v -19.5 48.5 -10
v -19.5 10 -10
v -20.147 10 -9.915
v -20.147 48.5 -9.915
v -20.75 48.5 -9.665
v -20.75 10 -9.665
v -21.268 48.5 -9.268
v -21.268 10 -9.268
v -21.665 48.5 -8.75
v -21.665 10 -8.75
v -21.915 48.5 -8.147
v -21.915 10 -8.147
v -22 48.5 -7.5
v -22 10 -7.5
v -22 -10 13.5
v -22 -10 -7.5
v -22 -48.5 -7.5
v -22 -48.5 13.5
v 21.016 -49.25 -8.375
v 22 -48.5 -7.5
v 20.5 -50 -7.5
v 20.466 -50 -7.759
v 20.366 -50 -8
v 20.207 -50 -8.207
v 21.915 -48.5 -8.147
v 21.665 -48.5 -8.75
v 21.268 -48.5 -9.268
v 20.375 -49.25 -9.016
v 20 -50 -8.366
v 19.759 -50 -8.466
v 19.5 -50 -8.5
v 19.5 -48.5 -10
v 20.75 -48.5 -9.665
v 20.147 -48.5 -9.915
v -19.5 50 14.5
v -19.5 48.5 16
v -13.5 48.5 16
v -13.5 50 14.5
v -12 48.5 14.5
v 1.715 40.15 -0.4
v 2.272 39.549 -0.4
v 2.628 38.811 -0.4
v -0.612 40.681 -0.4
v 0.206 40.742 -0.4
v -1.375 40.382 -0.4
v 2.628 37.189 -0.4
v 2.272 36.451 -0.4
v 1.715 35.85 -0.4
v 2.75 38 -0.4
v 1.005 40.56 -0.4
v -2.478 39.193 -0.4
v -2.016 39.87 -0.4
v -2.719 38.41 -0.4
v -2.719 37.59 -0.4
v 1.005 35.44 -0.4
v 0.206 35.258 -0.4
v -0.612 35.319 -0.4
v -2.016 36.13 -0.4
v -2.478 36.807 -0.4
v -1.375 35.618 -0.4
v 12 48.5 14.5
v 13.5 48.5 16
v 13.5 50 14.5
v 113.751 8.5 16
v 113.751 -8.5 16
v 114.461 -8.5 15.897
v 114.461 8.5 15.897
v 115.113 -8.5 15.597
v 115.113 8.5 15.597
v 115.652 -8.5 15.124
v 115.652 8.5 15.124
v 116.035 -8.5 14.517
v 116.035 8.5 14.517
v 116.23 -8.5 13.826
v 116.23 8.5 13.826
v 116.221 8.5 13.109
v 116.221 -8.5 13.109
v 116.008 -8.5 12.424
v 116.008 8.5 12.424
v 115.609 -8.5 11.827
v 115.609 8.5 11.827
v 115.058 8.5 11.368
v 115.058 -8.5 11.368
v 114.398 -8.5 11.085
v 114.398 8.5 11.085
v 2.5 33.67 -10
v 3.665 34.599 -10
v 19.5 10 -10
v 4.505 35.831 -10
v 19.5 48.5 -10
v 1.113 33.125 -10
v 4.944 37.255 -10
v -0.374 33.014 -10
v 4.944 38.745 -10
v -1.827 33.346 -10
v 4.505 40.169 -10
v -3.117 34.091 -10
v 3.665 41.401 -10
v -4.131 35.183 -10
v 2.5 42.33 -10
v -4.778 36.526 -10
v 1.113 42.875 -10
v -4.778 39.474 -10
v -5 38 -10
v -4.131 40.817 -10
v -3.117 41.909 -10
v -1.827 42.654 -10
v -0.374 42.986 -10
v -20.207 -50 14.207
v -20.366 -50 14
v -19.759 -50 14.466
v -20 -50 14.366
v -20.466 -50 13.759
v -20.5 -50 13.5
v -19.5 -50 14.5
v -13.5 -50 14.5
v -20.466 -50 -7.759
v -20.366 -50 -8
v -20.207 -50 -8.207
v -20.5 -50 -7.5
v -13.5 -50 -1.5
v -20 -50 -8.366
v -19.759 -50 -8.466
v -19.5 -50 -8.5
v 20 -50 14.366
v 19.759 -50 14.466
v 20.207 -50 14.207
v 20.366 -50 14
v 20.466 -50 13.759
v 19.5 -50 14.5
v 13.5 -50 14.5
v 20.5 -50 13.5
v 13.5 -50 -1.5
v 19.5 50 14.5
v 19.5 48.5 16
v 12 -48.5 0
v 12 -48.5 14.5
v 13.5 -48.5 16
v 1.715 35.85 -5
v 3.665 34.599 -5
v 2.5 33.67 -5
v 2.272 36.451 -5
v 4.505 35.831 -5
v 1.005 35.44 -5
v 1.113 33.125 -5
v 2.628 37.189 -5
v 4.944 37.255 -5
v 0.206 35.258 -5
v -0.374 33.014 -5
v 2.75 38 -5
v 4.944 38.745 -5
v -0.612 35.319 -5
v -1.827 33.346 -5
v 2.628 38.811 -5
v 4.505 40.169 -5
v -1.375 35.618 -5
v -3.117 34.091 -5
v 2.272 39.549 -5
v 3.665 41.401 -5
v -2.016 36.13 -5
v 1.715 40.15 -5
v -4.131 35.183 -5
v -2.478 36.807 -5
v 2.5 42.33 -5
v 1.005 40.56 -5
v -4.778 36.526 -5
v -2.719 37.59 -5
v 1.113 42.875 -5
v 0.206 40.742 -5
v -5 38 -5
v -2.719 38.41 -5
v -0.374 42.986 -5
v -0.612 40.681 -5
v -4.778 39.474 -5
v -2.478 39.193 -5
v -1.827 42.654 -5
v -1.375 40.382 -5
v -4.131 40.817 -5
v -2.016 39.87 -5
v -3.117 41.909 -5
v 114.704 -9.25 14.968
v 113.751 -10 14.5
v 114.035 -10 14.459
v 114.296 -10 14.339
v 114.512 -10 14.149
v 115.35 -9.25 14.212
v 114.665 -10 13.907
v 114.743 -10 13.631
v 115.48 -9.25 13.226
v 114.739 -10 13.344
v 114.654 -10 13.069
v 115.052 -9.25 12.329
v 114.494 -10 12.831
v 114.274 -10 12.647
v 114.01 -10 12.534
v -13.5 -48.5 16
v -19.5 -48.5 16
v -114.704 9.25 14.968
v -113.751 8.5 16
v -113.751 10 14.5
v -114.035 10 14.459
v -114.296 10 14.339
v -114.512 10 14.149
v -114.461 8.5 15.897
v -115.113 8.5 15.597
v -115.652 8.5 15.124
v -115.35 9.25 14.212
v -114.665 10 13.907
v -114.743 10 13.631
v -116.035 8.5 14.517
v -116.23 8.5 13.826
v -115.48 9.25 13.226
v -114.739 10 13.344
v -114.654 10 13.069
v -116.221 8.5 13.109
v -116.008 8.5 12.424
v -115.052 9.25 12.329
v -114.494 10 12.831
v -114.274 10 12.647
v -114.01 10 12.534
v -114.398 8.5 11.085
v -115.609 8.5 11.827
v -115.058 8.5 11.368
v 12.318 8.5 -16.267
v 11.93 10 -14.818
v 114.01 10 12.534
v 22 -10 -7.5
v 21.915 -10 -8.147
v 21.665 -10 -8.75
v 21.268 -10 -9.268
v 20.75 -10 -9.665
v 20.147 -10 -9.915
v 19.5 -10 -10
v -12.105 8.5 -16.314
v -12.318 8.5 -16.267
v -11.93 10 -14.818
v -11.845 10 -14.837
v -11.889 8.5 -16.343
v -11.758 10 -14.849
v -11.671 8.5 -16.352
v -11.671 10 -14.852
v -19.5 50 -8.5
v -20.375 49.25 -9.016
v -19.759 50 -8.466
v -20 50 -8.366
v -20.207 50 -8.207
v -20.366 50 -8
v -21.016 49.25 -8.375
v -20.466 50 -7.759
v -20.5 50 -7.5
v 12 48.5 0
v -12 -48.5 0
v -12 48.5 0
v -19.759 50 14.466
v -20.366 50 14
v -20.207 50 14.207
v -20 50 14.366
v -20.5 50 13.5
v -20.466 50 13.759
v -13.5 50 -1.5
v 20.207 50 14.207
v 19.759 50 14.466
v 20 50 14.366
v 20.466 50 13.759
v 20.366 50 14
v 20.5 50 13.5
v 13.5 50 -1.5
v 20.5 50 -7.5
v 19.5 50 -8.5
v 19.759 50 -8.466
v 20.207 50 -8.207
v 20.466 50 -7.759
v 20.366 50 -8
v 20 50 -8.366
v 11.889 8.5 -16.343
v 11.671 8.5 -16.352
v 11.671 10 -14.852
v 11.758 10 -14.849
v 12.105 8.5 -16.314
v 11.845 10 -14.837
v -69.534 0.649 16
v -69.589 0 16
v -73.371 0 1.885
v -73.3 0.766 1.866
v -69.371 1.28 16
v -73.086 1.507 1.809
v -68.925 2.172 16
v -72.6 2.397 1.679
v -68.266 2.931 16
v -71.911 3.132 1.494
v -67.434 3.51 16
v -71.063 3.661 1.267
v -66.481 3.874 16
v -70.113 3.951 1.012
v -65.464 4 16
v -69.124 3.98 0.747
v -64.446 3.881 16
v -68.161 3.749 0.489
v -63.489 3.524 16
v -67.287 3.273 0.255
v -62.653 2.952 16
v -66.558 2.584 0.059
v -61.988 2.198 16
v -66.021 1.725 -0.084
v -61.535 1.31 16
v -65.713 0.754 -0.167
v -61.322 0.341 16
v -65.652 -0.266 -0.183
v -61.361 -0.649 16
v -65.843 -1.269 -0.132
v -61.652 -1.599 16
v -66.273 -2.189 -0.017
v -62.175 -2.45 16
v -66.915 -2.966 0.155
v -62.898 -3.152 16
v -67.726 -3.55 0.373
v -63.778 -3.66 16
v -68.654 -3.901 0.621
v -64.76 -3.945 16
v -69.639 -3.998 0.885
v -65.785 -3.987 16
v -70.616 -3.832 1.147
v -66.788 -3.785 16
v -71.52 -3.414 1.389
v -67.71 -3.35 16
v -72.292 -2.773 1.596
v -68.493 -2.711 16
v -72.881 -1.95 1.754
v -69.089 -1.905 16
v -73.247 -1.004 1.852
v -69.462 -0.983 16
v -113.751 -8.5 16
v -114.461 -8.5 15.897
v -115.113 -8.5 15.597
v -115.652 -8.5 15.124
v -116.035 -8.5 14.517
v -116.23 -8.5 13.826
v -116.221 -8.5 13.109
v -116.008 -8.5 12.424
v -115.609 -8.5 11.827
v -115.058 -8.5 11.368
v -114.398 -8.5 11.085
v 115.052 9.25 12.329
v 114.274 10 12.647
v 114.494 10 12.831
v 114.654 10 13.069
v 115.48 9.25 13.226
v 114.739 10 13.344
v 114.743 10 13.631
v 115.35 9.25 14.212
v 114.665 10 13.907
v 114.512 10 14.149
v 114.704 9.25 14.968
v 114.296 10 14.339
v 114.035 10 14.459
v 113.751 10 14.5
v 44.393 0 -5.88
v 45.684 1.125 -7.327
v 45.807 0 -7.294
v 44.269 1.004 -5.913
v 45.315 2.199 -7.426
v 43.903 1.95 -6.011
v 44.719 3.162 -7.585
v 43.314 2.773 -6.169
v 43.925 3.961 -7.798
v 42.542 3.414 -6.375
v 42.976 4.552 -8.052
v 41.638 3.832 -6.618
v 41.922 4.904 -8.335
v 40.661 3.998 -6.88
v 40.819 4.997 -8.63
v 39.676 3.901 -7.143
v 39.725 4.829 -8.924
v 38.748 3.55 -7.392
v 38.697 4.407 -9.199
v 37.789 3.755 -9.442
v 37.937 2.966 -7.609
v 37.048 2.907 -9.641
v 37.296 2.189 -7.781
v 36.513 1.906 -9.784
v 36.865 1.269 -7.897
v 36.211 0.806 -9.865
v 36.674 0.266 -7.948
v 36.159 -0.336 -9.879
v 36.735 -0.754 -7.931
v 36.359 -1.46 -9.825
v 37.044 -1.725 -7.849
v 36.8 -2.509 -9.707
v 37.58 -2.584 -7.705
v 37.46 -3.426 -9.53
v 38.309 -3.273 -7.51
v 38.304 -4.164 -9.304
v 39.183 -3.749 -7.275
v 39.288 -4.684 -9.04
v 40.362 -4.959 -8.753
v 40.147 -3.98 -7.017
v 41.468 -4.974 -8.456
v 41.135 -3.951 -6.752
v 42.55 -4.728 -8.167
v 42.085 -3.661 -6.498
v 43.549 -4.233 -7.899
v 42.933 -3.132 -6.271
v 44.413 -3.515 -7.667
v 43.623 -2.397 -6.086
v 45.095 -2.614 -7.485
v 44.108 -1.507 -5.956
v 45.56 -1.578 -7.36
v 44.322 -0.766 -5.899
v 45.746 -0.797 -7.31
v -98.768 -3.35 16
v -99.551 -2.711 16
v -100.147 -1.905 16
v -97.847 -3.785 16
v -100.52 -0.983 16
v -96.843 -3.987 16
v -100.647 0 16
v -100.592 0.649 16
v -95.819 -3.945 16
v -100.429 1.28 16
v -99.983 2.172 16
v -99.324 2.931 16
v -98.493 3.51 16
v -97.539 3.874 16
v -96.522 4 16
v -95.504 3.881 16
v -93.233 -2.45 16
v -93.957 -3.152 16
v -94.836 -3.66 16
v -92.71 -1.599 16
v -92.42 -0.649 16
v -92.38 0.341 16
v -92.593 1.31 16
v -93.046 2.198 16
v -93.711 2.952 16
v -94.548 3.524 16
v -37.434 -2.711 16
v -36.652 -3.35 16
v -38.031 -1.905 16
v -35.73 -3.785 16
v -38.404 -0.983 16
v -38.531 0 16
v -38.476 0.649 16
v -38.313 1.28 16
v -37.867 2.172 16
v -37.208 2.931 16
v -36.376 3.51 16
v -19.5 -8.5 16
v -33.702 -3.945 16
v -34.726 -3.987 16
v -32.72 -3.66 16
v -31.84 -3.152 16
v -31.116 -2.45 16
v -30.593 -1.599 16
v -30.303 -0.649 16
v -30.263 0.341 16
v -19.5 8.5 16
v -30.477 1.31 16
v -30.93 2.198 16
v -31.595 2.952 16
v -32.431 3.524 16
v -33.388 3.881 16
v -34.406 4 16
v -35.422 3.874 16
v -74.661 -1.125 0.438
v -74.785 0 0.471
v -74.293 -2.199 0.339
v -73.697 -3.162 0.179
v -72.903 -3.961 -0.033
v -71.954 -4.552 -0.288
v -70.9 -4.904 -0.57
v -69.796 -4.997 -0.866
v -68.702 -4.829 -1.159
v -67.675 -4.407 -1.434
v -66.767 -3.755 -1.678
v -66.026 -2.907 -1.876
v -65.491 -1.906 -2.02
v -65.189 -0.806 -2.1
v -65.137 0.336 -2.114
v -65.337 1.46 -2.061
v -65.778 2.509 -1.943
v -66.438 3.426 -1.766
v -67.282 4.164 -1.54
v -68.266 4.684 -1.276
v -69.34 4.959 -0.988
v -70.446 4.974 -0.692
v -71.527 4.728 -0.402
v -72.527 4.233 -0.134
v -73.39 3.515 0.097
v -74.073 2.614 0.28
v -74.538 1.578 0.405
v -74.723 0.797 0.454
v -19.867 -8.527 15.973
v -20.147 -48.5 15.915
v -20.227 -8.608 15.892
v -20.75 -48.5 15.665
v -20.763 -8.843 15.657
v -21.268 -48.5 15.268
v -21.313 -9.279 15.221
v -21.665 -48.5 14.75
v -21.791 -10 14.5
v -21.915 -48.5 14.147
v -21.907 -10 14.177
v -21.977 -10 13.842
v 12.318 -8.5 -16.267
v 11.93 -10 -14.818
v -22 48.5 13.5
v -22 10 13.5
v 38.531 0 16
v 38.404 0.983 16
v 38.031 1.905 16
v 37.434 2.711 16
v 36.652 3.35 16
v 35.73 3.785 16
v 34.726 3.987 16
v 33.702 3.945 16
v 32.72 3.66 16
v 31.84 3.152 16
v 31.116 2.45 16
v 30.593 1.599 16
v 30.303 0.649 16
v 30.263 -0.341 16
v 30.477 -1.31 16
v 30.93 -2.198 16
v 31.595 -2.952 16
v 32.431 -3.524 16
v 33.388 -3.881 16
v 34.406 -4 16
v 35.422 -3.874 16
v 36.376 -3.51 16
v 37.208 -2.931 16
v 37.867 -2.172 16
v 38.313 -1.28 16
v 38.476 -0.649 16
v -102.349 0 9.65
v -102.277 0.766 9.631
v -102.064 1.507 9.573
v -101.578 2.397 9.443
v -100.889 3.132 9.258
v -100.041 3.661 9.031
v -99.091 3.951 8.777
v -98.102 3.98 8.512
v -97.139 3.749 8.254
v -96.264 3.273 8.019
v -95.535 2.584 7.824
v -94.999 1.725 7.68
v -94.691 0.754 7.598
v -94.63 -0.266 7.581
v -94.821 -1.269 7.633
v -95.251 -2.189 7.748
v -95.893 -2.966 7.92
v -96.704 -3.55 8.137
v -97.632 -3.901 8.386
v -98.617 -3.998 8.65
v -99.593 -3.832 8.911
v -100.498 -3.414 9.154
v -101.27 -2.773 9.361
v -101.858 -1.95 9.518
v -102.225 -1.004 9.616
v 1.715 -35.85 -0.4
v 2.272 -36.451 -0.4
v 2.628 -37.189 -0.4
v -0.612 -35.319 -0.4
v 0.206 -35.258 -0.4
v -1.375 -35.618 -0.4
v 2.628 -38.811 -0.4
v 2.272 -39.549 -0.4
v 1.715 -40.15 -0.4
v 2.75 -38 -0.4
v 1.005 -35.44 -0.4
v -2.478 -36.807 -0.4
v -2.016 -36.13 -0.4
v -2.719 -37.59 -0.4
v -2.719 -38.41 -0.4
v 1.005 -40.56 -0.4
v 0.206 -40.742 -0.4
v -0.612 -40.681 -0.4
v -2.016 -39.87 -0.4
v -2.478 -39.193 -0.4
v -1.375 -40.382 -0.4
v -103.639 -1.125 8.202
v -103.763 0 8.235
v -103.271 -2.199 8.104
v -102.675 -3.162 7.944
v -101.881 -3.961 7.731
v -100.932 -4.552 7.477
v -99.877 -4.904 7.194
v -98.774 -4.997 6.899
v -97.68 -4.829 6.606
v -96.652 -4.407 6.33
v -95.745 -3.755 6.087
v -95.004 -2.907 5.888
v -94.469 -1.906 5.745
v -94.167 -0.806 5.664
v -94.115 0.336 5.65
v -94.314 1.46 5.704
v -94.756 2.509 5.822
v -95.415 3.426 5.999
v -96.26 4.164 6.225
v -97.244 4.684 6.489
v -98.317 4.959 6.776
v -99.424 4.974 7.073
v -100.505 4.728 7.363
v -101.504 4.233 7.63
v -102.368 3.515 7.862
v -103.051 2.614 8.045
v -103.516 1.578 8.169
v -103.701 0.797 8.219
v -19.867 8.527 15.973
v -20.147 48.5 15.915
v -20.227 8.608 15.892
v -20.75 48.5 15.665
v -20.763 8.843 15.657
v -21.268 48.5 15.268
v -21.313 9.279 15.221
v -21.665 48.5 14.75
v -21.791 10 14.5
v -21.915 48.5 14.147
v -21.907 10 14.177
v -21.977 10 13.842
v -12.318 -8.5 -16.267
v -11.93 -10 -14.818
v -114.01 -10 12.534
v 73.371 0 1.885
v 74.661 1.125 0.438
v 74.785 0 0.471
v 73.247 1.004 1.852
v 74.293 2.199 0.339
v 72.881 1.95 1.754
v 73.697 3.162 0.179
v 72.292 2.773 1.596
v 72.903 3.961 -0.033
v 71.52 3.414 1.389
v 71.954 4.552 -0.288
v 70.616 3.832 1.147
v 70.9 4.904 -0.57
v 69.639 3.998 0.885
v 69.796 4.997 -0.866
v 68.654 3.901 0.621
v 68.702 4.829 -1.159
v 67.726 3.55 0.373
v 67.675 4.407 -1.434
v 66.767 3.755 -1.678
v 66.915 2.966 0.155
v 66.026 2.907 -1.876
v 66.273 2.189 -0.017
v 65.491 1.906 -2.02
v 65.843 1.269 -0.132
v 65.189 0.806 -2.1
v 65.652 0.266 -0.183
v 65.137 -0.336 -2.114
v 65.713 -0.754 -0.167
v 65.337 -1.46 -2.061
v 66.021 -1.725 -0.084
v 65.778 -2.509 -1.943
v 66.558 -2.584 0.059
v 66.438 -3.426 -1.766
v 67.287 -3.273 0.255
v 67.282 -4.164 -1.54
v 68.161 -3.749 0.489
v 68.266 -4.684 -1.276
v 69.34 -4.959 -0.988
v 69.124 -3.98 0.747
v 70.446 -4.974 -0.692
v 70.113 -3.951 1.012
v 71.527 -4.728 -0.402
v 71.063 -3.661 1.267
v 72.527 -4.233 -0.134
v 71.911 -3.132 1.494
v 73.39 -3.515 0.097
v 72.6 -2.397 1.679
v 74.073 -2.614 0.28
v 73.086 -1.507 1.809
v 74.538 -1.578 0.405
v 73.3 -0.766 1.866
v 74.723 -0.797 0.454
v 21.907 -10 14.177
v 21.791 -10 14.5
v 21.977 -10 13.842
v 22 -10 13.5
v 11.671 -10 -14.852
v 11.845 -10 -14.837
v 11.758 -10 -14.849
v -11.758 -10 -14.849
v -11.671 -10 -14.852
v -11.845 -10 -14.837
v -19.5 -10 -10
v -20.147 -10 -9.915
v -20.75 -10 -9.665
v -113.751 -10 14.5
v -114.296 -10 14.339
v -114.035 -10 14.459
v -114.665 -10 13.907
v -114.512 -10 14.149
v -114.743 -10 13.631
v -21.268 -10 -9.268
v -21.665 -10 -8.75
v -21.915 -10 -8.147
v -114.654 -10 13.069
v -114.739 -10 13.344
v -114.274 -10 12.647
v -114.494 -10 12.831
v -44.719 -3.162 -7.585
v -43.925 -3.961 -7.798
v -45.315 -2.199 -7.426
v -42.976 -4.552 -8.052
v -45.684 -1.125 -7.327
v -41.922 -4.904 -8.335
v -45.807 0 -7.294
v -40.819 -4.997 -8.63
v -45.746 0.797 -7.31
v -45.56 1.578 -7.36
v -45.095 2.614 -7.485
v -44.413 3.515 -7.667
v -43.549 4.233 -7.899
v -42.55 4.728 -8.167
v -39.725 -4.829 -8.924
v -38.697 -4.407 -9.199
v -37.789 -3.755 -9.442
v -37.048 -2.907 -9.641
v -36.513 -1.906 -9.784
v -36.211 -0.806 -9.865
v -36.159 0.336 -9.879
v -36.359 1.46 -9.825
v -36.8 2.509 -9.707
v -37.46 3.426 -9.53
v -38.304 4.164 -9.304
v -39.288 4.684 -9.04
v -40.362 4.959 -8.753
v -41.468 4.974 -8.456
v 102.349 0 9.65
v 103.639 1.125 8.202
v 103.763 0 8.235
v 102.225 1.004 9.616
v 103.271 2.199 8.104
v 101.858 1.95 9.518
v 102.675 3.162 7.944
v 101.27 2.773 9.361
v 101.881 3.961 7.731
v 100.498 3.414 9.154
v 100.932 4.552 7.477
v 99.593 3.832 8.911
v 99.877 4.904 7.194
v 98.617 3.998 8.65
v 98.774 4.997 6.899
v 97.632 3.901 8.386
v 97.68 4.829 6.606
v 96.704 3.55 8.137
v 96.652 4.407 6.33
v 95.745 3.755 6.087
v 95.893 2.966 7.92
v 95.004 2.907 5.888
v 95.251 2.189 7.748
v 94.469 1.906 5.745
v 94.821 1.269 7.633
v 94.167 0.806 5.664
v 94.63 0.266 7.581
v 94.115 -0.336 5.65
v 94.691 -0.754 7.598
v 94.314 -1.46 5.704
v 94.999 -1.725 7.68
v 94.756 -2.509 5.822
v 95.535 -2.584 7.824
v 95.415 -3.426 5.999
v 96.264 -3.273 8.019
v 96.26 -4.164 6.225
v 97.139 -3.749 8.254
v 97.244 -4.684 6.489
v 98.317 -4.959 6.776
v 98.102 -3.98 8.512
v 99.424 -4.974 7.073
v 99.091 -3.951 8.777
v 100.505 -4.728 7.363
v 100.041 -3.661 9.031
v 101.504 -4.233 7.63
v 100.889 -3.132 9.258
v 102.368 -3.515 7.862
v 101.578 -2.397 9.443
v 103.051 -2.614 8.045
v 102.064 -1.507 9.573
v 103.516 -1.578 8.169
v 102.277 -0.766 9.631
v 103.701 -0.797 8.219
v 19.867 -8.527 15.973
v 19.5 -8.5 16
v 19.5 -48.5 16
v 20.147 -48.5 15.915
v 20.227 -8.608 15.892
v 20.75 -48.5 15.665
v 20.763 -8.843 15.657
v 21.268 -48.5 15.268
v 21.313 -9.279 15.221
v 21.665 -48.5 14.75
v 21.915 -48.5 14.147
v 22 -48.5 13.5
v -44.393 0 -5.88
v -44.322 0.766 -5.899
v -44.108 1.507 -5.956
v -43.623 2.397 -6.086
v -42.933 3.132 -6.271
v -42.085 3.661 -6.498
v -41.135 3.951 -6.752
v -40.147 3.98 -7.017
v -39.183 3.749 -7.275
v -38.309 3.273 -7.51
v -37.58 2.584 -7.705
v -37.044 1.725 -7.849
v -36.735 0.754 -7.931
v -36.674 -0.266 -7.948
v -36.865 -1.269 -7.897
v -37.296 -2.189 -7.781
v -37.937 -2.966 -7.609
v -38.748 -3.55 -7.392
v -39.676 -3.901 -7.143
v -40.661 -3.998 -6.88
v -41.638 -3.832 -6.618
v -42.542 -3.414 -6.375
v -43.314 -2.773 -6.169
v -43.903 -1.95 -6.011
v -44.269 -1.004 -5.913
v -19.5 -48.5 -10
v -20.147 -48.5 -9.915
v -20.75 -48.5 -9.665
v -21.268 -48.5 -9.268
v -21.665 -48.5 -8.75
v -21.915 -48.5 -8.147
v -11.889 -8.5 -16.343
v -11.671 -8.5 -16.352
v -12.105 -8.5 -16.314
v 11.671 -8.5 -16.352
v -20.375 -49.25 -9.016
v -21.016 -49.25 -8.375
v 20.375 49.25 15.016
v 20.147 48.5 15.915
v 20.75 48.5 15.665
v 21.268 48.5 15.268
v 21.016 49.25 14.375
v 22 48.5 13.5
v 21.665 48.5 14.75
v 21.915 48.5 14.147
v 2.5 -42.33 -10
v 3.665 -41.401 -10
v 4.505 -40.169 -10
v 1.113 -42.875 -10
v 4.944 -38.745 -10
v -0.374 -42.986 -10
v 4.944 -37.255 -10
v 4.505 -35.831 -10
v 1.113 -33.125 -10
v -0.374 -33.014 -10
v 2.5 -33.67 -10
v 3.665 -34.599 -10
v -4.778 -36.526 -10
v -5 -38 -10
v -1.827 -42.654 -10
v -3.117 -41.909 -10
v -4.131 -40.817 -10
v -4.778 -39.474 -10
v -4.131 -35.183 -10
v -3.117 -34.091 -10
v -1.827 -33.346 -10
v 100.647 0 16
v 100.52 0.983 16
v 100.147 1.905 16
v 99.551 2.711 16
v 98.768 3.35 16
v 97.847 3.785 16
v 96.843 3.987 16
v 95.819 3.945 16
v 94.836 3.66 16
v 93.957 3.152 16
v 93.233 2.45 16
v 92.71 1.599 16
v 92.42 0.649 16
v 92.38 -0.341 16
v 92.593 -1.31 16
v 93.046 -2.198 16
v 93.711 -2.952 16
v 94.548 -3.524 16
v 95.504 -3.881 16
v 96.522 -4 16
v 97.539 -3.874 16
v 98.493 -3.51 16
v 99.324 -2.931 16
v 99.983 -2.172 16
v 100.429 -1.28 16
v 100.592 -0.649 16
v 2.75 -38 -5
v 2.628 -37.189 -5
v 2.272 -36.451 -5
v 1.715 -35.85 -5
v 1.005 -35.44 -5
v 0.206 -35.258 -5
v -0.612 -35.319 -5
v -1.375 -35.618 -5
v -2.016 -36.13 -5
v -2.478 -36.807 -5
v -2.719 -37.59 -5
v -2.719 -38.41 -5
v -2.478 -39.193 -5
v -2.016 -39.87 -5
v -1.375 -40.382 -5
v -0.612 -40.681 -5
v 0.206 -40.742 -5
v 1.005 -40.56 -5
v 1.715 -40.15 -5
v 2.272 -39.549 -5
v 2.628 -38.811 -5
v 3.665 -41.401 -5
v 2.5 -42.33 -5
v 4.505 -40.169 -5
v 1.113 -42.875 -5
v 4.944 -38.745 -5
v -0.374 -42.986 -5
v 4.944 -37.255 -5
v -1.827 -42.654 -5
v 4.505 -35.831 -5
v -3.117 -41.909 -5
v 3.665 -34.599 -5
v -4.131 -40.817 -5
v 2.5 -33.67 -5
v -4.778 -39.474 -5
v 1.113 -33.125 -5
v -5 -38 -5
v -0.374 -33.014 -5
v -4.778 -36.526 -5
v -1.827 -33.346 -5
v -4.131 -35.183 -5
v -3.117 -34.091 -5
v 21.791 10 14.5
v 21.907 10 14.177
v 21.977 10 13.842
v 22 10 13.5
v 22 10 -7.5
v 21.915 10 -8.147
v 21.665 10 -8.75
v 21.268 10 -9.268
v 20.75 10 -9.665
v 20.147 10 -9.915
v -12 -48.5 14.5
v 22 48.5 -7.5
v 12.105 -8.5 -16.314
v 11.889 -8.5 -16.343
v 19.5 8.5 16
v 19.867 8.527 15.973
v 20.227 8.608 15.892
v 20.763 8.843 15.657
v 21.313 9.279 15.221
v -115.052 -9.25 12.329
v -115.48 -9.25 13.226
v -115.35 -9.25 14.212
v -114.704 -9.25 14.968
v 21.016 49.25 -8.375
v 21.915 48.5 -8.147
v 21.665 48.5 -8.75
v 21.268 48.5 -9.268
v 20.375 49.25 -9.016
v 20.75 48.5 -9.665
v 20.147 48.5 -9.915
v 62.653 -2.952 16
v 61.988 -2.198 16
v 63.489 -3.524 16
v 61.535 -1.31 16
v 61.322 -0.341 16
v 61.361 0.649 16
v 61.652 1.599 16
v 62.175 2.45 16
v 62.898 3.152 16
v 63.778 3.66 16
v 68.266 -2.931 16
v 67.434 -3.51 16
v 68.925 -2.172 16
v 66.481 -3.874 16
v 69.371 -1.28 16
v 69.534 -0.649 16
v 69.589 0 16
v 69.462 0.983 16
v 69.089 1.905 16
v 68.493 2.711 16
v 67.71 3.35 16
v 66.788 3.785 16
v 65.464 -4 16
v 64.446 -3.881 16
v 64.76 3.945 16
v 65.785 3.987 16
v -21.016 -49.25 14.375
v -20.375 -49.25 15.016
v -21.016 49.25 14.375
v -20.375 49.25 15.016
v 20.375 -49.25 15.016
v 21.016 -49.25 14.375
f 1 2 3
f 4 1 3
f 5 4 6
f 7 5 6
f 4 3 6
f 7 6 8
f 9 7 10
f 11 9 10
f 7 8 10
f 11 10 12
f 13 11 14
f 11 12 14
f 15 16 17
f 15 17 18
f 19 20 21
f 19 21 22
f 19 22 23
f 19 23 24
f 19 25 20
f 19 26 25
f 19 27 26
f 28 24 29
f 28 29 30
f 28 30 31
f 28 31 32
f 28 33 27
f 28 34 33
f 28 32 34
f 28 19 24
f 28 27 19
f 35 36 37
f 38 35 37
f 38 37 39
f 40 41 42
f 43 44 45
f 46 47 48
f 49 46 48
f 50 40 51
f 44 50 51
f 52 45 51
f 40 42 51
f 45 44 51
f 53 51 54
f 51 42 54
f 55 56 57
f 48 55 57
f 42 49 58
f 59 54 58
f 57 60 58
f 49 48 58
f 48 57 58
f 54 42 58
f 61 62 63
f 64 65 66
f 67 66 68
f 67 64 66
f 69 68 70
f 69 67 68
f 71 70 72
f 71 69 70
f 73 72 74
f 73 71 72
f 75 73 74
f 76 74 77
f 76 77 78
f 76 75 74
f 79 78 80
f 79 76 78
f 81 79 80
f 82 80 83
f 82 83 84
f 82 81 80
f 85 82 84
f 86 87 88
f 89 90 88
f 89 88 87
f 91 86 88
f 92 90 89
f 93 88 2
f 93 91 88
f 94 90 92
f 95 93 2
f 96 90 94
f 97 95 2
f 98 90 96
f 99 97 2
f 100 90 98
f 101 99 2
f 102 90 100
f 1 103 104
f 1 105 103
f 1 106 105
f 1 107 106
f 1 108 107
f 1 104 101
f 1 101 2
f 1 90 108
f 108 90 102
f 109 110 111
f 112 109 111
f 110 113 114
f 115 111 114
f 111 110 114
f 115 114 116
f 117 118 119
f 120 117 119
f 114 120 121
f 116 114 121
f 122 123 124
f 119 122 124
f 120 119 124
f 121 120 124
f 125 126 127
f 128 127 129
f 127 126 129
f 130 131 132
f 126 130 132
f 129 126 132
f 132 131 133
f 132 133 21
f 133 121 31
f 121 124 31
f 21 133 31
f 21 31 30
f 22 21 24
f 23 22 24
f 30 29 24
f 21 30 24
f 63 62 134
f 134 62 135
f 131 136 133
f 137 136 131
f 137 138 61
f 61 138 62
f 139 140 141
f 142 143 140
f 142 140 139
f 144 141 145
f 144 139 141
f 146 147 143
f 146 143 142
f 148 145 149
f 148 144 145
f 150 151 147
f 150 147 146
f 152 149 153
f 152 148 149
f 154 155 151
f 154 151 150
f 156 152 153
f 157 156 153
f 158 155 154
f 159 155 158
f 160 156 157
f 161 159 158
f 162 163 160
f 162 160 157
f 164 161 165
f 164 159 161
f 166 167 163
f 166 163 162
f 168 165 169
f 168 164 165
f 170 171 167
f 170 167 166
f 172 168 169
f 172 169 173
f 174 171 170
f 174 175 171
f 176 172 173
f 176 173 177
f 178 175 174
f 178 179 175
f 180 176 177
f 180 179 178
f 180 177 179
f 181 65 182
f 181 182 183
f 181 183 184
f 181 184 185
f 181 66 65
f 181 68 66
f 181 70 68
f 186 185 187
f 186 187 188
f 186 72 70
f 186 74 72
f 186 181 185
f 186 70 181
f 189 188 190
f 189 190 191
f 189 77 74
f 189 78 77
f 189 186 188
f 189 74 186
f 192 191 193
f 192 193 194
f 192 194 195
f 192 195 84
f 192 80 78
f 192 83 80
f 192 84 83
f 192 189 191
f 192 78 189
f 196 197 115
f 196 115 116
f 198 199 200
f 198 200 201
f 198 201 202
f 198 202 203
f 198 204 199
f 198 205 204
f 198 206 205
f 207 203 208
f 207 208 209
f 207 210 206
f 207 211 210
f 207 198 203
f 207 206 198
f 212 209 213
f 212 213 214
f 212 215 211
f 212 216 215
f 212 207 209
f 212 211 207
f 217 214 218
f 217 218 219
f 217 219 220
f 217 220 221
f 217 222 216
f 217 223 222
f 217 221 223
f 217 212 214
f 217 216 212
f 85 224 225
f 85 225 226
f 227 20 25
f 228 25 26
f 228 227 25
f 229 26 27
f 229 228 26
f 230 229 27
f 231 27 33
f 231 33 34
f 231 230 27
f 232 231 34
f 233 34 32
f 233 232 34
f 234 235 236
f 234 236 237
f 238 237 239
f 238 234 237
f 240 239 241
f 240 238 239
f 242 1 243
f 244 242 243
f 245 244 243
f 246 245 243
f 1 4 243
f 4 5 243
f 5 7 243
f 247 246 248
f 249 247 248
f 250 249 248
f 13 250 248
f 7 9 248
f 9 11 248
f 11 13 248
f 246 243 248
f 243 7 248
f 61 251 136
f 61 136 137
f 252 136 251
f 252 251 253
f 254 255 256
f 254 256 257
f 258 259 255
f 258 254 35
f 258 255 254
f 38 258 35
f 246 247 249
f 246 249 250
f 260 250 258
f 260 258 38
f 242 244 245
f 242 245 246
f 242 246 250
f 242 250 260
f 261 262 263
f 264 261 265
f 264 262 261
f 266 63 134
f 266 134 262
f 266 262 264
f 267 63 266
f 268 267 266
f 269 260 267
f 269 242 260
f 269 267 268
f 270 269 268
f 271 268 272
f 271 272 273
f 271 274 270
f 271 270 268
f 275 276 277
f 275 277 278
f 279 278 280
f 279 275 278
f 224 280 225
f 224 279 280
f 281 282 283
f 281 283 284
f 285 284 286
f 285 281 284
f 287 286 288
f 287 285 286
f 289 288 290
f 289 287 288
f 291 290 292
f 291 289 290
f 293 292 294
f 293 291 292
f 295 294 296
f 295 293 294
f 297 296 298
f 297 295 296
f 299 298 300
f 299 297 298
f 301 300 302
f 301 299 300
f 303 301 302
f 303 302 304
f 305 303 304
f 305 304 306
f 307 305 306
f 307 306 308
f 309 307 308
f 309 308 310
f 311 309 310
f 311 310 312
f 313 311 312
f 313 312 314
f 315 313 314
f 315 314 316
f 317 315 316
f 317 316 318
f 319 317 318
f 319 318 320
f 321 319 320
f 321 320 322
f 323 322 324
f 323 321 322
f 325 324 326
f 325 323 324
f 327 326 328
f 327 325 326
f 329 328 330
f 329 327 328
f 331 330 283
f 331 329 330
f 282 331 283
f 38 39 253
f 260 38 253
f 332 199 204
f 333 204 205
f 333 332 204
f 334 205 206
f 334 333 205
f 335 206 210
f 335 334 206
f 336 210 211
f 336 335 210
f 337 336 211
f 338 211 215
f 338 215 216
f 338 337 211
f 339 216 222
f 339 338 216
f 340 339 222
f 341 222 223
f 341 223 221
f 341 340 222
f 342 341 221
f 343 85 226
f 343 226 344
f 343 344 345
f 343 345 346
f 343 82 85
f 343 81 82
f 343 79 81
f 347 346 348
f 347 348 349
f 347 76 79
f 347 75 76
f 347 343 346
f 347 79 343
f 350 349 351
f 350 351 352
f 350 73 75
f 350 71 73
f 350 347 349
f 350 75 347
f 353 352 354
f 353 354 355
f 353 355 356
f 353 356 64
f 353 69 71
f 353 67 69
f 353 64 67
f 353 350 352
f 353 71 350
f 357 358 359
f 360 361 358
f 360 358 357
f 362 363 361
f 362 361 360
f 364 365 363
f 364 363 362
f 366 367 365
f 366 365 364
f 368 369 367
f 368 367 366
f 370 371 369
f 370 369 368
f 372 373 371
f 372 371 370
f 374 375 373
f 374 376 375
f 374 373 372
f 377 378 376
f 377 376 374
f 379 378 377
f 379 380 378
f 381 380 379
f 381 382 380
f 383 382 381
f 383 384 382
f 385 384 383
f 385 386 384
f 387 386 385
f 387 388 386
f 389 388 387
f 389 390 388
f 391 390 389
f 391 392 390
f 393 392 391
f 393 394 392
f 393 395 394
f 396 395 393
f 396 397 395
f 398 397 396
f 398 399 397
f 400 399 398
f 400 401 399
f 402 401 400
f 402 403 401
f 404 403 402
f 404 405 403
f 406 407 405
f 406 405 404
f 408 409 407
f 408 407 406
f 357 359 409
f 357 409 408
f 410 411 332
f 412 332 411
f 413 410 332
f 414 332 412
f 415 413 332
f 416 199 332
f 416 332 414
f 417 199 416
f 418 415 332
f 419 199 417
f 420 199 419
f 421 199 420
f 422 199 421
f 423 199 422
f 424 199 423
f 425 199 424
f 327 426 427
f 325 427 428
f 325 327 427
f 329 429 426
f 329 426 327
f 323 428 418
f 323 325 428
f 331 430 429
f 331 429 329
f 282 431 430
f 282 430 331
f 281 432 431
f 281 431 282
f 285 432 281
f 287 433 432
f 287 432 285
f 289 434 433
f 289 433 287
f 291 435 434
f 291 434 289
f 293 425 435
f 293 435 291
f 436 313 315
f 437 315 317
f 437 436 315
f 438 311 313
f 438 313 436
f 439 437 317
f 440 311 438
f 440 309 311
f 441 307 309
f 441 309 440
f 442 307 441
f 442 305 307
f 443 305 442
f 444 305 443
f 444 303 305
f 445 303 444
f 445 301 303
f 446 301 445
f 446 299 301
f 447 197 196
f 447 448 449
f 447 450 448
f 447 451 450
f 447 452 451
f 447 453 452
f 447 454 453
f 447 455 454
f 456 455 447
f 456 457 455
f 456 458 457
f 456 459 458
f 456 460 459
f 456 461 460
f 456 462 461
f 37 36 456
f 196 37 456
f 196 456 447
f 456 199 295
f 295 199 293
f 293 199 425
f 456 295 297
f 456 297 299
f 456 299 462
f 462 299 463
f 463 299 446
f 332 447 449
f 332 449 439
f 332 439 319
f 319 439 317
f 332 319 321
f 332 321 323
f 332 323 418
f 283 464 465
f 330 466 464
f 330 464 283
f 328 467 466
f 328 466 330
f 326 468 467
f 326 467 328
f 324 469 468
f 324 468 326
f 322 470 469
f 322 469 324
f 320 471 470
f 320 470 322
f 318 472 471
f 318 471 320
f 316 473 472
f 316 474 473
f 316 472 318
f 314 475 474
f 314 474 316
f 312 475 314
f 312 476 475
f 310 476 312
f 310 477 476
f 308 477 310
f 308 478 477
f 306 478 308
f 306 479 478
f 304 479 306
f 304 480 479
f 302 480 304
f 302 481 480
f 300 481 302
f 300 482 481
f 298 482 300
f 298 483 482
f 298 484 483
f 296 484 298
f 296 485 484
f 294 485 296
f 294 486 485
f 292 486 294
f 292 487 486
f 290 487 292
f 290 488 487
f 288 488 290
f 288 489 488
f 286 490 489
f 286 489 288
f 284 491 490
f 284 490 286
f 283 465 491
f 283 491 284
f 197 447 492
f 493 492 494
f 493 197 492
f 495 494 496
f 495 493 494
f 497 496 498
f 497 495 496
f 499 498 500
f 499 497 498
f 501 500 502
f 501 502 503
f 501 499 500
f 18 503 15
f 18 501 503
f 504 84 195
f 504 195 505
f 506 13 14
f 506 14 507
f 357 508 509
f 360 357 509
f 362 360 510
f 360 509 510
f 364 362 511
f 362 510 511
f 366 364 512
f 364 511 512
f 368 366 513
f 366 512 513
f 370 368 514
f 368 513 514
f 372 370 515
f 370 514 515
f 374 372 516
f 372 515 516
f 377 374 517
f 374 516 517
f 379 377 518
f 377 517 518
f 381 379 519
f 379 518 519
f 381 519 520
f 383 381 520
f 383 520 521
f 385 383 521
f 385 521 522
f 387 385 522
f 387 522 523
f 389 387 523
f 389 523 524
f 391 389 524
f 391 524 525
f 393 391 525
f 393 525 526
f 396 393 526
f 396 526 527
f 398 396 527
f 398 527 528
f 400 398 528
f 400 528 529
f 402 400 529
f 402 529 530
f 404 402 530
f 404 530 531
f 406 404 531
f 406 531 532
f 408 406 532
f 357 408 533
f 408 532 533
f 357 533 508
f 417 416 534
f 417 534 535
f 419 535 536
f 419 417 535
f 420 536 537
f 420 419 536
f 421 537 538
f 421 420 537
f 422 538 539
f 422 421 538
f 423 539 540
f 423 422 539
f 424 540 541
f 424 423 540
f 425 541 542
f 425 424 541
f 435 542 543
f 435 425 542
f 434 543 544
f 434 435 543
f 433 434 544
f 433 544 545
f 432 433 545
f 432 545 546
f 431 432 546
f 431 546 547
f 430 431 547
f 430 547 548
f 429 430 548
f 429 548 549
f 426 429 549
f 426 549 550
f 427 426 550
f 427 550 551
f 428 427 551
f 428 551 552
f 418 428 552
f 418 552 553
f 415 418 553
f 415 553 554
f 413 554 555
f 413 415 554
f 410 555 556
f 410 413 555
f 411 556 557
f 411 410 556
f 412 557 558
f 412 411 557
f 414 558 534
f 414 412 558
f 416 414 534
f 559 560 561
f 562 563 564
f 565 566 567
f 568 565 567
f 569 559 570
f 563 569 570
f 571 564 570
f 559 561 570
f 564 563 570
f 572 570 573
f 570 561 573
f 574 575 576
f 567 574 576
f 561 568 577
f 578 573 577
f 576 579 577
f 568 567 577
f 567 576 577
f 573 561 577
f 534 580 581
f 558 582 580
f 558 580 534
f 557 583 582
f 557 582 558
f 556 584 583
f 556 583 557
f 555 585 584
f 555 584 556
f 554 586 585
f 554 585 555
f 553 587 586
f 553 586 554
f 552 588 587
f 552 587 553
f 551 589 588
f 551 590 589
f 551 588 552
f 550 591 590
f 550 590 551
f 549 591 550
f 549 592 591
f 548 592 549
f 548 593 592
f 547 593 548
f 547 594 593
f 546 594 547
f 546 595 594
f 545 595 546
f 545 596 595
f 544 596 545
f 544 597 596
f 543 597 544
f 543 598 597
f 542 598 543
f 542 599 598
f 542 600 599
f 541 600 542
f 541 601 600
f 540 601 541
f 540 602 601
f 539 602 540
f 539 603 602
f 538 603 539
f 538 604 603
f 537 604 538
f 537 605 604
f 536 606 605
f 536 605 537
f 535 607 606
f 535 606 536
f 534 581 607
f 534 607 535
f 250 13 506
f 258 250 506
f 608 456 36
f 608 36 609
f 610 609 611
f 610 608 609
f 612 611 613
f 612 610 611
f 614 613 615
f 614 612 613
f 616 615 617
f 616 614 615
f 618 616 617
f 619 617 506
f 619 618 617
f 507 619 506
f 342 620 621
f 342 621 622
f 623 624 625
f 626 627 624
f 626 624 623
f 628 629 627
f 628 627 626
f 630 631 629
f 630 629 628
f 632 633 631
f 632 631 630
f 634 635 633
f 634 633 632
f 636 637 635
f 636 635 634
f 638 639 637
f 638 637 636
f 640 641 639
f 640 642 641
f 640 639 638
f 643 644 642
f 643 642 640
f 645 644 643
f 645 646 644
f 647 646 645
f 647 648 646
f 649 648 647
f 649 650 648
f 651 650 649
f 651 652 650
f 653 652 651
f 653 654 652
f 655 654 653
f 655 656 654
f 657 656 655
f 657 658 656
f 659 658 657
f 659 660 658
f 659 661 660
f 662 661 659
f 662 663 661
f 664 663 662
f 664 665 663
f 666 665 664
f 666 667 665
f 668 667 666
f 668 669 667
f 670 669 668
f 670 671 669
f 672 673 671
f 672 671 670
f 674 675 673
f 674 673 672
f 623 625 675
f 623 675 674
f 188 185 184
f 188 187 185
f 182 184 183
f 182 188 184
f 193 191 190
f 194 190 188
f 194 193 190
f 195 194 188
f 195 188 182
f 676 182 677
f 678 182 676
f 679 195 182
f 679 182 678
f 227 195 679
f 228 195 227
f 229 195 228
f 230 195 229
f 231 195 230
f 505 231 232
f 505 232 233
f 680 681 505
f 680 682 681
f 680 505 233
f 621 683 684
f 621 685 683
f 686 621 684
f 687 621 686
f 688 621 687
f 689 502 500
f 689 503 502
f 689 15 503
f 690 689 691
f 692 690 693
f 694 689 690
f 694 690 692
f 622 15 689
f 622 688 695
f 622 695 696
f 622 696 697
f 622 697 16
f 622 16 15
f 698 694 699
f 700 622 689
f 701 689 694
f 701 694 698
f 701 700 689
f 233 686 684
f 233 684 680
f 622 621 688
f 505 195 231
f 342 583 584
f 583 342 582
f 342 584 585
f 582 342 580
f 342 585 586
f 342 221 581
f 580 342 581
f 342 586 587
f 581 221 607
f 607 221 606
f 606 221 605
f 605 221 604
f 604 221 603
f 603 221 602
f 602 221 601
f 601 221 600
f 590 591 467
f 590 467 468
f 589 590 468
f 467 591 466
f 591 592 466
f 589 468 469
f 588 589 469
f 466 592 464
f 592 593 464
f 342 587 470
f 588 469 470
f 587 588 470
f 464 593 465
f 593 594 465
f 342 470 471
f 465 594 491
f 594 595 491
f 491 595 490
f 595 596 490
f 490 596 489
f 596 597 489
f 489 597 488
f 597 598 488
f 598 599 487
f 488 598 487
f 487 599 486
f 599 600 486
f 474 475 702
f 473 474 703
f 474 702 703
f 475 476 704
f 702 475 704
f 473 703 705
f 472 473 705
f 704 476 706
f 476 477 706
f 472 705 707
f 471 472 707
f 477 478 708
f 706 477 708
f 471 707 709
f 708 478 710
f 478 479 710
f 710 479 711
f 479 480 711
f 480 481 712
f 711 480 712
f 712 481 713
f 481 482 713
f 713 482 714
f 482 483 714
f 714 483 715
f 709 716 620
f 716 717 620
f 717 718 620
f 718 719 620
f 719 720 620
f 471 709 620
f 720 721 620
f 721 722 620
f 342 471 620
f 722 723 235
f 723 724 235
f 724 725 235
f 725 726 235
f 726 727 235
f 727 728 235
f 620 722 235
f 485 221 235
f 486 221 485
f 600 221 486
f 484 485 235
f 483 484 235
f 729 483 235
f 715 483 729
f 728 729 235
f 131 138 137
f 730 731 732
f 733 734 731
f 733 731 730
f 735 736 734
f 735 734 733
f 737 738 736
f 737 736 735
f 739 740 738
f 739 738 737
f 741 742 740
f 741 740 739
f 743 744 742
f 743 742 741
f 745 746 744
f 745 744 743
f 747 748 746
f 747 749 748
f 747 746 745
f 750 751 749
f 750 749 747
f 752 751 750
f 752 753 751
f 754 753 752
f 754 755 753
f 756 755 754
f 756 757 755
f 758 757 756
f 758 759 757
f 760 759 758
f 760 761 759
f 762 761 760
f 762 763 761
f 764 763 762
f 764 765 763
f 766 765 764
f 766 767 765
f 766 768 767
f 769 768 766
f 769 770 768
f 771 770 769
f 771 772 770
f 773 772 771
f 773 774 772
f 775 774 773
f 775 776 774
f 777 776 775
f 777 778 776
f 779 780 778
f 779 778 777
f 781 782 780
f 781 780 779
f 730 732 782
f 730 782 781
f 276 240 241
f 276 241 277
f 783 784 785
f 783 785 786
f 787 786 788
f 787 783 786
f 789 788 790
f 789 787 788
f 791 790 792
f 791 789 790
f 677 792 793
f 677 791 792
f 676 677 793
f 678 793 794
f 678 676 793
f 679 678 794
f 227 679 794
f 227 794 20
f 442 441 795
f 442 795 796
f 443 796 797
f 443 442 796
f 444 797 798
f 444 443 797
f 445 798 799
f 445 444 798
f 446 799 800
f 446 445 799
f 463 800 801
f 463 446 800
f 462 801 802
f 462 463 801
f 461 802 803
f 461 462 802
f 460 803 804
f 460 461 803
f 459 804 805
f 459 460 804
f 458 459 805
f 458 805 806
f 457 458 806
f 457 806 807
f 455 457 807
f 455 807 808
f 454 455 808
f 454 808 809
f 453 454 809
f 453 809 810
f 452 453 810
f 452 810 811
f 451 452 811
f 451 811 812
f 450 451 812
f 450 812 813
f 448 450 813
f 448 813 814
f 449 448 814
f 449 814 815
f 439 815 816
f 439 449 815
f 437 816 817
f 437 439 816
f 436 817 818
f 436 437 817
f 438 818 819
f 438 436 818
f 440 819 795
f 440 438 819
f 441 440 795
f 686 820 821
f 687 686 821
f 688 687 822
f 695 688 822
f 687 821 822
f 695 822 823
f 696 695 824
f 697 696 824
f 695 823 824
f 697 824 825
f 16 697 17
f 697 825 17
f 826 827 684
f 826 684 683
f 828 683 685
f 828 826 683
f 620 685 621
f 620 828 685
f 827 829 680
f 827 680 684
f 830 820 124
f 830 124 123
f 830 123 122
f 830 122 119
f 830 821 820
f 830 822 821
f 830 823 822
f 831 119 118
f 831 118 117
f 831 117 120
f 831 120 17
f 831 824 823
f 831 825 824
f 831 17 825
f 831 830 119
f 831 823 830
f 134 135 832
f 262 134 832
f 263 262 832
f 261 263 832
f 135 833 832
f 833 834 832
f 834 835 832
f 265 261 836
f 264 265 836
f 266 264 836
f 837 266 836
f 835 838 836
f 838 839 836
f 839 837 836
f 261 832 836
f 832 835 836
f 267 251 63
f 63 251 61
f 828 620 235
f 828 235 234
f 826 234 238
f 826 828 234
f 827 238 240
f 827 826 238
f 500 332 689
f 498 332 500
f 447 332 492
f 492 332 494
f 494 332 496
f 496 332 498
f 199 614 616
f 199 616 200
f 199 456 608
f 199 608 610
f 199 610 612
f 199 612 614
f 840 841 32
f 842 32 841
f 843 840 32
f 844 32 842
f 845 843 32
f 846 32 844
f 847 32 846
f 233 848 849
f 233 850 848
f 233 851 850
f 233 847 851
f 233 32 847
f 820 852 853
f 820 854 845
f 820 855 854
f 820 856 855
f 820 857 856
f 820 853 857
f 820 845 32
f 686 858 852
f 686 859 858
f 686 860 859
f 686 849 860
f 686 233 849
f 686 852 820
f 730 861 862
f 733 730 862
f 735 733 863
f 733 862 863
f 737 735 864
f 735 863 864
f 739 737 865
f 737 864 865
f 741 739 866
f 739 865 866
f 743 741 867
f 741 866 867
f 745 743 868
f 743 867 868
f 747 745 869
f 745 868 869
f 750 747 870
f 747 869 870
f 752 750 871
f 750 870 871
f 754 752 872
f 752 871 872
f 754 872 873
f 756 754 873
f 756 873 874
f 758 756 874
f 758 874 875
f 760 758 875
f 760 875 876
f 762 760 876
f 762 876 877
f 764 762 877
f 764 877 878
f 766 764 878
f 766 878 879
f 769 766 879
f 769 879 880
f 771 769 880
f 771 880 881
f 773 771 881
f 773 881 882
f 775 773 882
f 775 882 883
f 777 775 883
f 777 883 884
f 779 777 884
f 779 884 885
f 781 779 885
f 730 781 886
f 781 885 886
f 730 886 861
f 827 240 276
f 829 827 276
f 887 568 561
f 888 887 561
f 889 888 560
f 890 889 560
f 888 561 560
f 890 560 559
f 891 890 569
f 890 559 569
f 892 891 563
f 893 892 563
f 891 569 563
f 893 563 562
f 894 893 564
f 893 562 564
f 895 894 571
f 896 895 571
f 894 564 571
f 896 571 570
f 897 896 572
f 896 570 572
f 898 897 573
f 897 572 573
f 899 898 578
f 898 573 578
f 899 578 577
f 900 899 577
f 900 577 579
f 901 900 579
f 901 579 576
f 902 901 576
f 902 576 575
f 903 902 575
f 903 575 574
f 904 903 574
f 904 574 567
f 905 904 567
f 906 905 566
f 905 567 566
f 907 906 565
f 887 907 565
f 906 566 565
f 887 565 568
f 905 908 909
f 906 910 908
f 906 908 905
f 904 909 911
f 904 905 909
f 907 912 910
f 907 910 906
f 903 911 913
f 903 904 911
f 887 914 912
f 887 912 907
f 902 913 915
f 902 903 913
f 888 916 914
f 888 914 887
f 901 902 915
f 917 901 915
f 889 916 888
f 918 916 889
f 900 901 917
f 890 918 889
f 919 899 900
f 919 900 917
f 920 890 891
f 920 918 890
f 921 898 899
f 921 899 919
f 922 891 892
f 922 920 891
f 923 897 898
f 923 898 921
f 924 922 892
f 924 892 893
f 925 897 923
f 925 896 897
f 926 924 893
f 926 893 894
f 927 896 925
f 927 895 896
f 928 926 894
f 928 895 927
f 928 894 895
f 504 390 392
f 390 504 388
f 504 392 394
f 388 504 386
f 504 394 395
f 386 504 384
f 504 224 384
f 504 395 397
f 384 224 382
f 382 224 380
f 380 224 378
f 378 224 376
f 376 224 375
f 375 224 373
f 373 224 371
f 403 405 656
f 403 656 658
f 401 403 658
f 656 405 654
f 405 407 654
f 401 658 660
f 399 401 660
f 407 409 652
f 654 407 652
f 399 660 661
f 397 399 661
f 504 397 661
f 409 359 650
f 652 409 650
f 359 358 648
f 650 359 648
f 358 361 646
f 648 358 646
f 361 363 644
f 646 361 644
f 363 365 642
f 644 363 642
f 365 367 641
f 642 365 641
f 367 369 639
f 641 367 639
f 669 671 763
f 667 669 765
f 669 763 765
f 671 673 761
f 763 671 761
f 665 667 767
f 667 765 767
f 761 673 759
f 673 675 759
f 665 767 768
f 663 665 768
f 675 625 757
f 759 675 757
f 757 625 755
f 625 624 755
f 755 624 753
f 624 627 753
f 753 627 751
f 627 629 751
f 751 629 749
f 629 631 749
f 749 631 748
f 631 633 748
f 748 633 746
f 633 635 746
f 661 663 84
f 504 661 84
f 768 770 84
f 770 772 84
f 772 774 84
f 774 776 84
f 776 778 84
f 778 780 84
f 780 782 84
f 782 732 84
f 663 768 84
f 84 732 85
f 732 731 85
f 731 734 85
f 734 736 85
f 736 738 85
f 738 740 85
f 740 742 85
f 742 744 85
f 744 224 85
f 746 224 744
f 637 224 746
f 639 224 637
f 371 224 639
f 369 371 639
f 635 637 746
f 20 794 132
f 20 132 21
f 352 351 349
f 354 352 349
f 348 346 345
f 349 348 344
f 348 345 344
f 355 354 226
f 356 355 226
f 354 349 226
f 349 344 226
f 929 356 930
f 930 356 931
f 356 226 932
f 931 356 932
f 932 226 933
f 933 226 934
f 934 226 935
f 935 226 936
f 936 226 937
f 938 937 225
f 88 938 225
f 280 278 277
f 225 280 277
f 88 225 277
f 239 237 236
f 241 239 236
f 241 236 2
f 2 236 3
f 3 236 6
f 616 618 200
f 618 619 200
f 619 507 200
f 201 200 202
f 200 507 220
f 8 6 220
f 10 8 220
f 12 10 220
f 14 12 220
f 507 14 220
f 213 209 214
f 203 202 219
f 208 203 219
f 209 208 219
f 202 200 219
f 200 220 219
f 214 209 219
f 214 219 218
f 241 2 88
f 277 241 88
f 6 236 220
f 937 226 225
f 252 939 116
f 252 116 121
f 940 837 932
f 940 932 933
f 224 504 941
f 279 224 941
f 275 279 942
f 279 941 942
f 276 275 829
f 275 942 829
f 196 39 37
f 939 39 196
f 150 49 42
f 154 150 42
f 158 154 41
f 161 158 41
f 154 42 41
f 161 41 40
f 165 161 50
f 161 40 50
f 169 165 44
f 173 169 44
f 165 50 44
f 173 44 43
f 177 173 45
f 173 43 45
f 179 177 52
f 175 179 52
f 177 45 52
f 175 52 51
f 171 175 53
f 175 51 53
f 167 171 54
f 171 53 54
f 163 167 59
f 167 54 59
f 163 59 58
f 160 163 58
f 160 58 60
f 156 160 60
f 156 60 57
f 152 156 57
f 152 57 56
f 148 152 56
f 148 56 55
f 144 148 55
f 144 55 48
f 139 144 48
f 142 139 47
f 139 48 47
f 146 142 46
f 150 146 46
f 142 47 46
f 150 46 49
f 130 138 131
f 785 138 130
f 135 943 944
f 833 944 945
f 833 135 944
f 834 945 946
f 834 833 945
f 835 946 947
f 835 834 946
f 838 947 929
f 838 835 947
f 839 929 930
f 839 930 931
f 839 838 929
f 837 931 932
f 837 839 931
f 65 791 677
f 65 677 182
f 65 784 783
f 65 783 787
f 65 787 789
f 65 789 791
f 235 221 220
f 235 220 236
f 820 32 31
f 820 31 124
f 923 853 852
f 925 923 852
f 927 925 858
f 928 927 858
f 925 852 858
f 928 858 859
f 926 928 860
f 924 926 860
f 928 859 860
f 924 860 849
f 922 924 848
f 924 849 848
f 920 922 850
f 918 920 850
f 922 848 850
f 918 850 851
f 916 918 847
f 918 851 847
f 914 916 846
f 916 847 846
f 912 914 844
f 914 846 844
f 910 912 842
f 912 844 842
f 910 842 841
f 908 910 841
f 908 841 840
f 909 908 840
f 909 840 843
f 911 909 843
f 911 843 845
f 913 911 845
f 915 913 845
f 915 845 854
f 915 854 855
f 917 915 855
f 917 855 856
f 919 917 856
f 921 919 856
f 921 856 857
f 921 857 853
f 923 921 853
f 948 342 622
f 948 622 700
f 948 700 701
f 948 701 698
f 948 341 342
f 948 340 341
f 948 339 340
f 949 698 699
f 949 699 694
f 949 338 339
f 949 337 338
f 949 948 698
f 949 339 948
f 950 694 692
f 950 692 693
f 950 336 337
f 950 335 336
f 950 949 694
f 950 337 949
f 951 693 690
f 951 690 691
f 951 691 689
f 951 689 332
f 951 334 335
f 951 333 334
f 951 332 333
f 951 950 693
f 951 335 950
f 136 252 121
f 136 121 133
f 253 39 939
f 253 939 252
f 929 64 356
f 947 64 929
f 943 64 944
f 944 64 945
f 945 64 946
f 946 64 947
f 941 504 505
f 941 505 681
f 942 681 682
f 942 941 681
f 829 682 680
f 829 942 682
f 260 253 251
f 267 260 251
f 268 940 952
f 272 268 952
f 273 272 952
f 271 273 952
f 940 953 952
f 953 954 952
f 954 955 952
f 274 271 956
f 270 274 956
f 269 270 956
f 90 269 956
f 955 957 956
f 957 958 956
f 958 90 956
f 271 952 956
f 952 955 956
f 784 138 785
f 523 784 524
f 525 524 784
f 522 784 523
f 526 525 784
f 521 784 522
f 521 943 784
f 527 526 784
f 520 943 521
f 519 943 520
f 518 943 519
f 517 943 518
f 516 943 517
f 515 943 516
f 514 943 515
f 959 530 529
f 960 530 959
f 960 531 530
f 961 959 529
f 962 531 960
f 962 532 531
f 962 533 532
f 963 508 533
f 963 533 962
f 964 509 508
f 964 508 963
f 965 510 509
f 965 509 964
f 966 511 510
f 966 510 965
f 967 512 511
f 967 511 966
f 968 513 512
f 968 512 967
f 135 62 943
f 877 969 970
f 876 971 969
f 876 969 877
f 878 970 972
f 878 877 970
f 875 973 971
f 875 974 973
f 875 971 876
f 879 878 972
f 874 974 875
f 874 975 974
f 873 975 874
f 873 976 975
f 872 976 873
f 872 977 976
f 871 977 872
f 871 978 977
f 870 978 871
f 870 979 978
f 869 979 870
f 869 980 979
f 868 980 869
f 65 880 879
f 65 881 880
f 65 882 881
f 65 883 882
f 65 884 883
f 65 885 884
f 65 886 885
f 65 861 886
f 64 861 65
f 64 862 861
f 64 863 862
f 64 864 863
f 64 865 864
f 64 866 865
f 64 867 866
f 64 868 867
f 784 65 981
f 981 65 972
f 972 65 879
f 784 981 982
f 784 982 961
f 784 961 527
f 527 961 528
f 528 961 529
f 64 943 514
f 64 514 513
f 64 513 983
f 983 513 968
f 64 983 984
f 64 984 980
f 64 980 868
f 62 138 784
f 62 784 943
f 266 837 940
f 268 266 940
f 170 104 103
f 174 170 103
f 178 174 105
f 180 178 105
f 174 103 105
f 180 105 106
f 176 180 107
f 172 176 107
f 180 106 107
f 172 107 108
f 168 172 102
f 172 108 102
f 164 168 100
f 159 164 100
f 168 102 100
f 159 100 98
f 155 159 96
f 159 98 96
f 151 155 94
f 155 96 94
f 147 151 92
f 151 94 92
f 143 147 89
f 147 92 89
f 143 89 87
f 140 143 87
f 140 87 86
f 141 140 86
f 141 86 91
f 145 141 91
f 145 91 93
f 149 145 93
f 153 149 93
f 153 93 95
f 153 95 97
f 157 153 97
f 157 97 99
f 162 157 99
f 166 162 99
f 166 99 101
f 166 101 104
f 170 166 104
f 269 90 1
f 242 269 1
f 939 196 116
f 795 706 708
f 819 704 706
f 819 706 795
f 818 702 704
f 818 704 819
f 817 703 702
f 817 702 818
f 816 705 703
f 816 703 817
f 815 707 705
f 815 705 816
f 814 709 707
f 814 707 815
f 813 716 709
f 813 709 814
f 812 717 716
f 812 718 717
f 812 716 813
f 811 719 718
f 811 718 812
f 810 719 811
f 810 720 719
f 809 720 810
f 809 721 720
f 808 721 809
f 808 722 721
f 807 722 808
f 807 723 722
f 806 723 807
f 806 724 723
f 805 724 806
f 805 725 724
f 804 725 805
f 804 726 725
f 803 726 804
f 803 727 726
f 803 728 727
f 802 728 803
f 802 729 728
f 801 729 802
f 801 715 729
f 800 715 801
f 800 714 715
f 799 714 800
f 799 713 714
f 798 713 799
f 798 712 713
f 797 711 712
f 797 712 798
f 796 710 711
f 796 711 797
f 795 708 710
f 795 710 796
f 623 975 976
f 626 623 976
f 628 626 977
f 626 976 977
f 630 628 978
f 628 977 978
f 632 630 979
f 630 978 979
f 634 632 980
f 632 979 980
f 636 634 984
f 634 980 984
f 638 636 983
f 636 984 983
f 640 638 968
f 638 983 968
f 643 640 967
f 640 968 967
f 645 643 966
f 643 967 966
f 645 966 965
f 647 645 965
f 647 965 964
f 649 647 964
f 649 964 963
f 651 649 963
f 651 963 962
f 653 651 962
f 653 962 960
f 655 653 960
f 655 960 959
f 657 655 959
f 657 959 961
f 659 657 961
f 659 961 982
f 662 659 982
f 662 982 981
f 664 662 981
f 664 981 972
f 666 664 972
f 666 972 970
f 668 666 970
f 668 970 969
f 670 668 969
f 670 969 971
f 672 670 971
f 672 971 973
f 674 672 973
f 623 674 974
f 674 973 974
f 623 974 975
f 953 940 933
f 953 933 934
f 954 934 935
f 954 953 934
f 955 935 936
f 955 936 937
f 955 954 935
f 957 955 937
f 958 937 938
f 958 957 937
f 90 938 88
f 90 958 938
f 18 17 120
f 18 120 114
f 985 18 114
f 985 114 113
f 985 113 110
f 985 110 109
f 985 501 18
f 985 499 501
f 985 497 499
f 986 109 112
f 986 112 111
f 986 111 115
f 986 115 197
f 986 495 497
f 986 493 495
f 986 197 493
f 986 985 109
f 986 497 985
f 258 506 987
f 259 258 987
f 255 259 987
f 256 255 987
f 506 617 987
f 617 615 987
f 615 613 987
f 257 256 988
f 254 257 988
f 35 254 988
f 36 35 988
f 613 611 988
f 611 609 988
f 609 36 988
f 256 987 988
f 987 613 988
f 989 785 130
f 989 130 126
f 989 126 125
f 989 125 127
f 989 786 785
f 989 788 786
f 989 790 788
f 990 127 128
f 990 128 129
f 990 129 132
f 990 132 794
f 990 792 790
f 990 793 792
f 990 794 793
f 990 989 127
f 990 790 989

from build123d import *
from OCP.BRepFilletAPI import BRepFilletAPI_MakeChamfer

# Parameters (mm, degrees)
BOSS_EXTRUDE1_DEPTH            = 10
BOSS_EXTRUDE2_DEPTH            = 50
F_8_0MM_DOWEL_HOLE1_D          = 8
FILLET1_R                      = 2.5
CHAMFER1_SIZE                  = 1.5
CBORE_FOR_M5_SHCS1_D           = 5.5
CBORE_FOR_M5_SHCS1_CBORE_D     = 10
CBORE_FOR_M5_SHCS1_CBORE_DEPTH = 5
SKETCH9_R                      = 2.75
BOSS_EXTRUDE3_DEPTH            = 0.4
CHAMFER2_SIZE                  = 1
CHAMFER2_SIZE2                 = 1.732050808


with BuildPart() as part:
    # Sketch1 → Boss-Extrude1 (new, symmetric)
    with BuildSketch(Plane(origin=(0, 0, 0), x_dir=(1, 0, 0), z_dir=(0, 1, 0))):
        Polygon((12, 0), (-12, 0), (-12, -16), (-132.740728286, -16), (-12, 16.352380638), (12, 16.352380638), (132.740728286, -16), (12, -16), align=None)
    extrude(amount=BOSS_EXTRUDE1_DEPTH, both=True)

    # Sketch2 → Boss-Extrude2 (add, symmetric)
    with BuildSketch(Plane(origin=(0, 0, 0), x_dir=(1, 0, 0), z_dir=(0, 1, 0))):
        Polygon((-12, -16), (-12, 0), (12, 0), (12, -16), (22, -16), (22, 10), (-22, 10), (-22, -16), align=None)
    extrude(amount=BOSS_EXTRUDE2_DEPTH, both=True)

    # Ø8.0mm Dowel Hole1 (through all)
    with Locations(Plane(origin=(4.891942737, 0, -18.256978841), x_dir=(-0.96592582628907, 0, -0.2588190451025143), z_dir=(0.2588190451025143, 0, -0.96592582628907))):
        with Locations((-97.358802374, 0), (-67.358802374, 0), (-37.358802374, 0)):
            f_8_0mm_dowel_hole1 = Hole(F_8_0MM_DOWEL_HOLE1_D / 2)

    # Mirror1: Ø8.0mm Dowel Hole1 across plane
    add(f_8_0mm_dowel_hole1.mirror(Plane(origin=(0, 0, 0), x_dir=(0, 0, 1), z_dir=(1, 0, 0))), mode=Mode.SUBTRACT)

    # Fillet1
    fillet1_edges = [part.edges().sort_by_distance(p)[0] for p in [
        (-132.740728286, 0, 16),
        (-12, 0, -16.352380638),
        (12, 0, -16.352380638),
        (132.740728286, 0, 16),
        (-22, 30, 16),
        (22, 30, 16),
        (22, 30, -10),
        (-22, 30, -10),
        (-22, -30, 16),
        (22, -30, 16),
        (22, -30, -10),
        (-22, -30, -10),
    ]]
    fillet(fillet1_edges, radius=FILLET1_R)

    # Chamfer1
    chamfer1_edges = [part.edges().sort_by_distance(p)[0] for p in [
        (0, 10, -16.352380638),
        (-66.625671502, -10, 16),
        (-63.358153493, -10, -2.591004885),
        (63.358153493, -10, -2.591004885),
        (-116.229955158, -10, 13.826315481),
        (116.229955158, -10, 13.826315481),
        (-11.997184237, -10, -16.330992791),
        (11.997184237, -10, -16.330992791),
        (63.358153493, 10, -2.591004885),
        (-63.358153493, 10, -2.591004885),
        (-66.625671502, 10, 16),
        (-116.229955158, 10, 13.826315481),
        (116.229955158, 10, 13.826315481),
        (-11.997184237, 10, -16.330992791),
        (11.997184237, 10, -16.330992791),
        (-15.75, 50, 16),
        (-15.75, -50, 16),
        (-22, -50, 3),
        (0, -50, -10),
        (22, -50, 3),
        (-21.267766953, -50, -9.267766953),
        (21.267766953, -50, -9.267766953),
        (21.267766953, -50, 15.267766953),
        (-21.267766953, -50, 15.267766953),
        (-22, 50, 3),
        (22, 50, 3),
        (0, 50, -10),
        (-21.267766953, 50, -9.267766953),
        (21.267766953, 50, -9.267766953),
        (21.267766953, 50, 15.267766953),
        (-21.267766953, 50, 15.267766953),
        (-12, 0, 16),
        (12, 0, 16),
        (66.625671502, -10, 16),
        (66.625671502, 10, 16),
        (-12, -50, 8),
        (0, -50, 0),
        (12, -50, 8),
        (15.75, -50, 16),
        (-12, 50, 8),
        (0, 50, 0),
        (12, 50, 8),
        (15.75, 50, 16),
        (0, -10, -16.352380638),
    ]]
    chamfer(chamfer1_edges, length=CHAMFER1_SIZE)

    # CBORE for M5 SHCS1 (through all)
    with Locations(Plane(origin=(0, 0, -10), x_dir=(-1, 0, 0), z_dir=(0, 0, -1))):
        with Locations((0, 38), (0, -38)):
            CounterBoreHole(CBORE_FOR_M5_SHCS1_D / 2, CBORE_FOR_M5_SHCS1_CBORE_D / 2, CBORE_FOR_M5_SHCS1_CBORE_DEPTH)

    # Sketch9 → Boss-Extrude3 (add)
    with BuildSketch(Plane.XY):
        with Locations(Location((0, -38, 0), (0, 0, 180))):
            Circle(SKETCH9_R)
        with Locations(Location((0, 38, 0), (0, 0, 180))):
            Circle(SKETCH9_R)
    extrude(amount=-BOSS_EXTRUDE3_DEPTH)

    # Chamfer2: one chamfer whose edges measure the first distance from different faces: ONE call of the kernel's chamfer builder (chamfer() names one face for all edges)
    chamfer2_edges_1 = [part.edges().sort_by_distance(p)[0] for p in [
        (37.114071484, 0, -9.623085465),
        (66.091846273, 0, -1.858514112),
        (95.069621061, 0, 5.906057241),
    ]]
    chamfer2_side_1 = [part.faces().sort_by_distance(p)[0] for p in [
        (62.753662863, 0, -2.752977661),
    ]]
    chamfer2_edges_2 = [part.edges().sort_by_distance(p)[0] for p in [
        (-37.114071484, 0, -9.623085465),
        (-66.091846273, 0, -1.858514112),
        (-95.069621061, 0, 5.906057241),
    ]]
    chamfer2_side_2 = [part.faces().sort_by_distance(p)[0] for p in [
        (-62.753662863, 0, -2.752977661),
    ]]
    chamfer2 = BRepFilletAPI_MakeChamfer(part.part.solid().wrapped)
    for e in chamfer2_edges_1:
        chamfer2.Add(CHAMFER2_SIZE, CHAMFER2_SIZE2, e.wrapped, chamfer2_side_1[0].wrapped)  # the first distance lies on this face
    for e in chamfer2_edges_2:
        chamfer2.Add(CHAMFER2_SIZE, CHAMFER2_SIZE2, e.wrapped, chamfer2_side_2[0].wrapped)  # the first distance lies on this face
    add(Compound.cast(chamfer2.Shape()), mode=Mode.REPLACE)


solid = part.part
